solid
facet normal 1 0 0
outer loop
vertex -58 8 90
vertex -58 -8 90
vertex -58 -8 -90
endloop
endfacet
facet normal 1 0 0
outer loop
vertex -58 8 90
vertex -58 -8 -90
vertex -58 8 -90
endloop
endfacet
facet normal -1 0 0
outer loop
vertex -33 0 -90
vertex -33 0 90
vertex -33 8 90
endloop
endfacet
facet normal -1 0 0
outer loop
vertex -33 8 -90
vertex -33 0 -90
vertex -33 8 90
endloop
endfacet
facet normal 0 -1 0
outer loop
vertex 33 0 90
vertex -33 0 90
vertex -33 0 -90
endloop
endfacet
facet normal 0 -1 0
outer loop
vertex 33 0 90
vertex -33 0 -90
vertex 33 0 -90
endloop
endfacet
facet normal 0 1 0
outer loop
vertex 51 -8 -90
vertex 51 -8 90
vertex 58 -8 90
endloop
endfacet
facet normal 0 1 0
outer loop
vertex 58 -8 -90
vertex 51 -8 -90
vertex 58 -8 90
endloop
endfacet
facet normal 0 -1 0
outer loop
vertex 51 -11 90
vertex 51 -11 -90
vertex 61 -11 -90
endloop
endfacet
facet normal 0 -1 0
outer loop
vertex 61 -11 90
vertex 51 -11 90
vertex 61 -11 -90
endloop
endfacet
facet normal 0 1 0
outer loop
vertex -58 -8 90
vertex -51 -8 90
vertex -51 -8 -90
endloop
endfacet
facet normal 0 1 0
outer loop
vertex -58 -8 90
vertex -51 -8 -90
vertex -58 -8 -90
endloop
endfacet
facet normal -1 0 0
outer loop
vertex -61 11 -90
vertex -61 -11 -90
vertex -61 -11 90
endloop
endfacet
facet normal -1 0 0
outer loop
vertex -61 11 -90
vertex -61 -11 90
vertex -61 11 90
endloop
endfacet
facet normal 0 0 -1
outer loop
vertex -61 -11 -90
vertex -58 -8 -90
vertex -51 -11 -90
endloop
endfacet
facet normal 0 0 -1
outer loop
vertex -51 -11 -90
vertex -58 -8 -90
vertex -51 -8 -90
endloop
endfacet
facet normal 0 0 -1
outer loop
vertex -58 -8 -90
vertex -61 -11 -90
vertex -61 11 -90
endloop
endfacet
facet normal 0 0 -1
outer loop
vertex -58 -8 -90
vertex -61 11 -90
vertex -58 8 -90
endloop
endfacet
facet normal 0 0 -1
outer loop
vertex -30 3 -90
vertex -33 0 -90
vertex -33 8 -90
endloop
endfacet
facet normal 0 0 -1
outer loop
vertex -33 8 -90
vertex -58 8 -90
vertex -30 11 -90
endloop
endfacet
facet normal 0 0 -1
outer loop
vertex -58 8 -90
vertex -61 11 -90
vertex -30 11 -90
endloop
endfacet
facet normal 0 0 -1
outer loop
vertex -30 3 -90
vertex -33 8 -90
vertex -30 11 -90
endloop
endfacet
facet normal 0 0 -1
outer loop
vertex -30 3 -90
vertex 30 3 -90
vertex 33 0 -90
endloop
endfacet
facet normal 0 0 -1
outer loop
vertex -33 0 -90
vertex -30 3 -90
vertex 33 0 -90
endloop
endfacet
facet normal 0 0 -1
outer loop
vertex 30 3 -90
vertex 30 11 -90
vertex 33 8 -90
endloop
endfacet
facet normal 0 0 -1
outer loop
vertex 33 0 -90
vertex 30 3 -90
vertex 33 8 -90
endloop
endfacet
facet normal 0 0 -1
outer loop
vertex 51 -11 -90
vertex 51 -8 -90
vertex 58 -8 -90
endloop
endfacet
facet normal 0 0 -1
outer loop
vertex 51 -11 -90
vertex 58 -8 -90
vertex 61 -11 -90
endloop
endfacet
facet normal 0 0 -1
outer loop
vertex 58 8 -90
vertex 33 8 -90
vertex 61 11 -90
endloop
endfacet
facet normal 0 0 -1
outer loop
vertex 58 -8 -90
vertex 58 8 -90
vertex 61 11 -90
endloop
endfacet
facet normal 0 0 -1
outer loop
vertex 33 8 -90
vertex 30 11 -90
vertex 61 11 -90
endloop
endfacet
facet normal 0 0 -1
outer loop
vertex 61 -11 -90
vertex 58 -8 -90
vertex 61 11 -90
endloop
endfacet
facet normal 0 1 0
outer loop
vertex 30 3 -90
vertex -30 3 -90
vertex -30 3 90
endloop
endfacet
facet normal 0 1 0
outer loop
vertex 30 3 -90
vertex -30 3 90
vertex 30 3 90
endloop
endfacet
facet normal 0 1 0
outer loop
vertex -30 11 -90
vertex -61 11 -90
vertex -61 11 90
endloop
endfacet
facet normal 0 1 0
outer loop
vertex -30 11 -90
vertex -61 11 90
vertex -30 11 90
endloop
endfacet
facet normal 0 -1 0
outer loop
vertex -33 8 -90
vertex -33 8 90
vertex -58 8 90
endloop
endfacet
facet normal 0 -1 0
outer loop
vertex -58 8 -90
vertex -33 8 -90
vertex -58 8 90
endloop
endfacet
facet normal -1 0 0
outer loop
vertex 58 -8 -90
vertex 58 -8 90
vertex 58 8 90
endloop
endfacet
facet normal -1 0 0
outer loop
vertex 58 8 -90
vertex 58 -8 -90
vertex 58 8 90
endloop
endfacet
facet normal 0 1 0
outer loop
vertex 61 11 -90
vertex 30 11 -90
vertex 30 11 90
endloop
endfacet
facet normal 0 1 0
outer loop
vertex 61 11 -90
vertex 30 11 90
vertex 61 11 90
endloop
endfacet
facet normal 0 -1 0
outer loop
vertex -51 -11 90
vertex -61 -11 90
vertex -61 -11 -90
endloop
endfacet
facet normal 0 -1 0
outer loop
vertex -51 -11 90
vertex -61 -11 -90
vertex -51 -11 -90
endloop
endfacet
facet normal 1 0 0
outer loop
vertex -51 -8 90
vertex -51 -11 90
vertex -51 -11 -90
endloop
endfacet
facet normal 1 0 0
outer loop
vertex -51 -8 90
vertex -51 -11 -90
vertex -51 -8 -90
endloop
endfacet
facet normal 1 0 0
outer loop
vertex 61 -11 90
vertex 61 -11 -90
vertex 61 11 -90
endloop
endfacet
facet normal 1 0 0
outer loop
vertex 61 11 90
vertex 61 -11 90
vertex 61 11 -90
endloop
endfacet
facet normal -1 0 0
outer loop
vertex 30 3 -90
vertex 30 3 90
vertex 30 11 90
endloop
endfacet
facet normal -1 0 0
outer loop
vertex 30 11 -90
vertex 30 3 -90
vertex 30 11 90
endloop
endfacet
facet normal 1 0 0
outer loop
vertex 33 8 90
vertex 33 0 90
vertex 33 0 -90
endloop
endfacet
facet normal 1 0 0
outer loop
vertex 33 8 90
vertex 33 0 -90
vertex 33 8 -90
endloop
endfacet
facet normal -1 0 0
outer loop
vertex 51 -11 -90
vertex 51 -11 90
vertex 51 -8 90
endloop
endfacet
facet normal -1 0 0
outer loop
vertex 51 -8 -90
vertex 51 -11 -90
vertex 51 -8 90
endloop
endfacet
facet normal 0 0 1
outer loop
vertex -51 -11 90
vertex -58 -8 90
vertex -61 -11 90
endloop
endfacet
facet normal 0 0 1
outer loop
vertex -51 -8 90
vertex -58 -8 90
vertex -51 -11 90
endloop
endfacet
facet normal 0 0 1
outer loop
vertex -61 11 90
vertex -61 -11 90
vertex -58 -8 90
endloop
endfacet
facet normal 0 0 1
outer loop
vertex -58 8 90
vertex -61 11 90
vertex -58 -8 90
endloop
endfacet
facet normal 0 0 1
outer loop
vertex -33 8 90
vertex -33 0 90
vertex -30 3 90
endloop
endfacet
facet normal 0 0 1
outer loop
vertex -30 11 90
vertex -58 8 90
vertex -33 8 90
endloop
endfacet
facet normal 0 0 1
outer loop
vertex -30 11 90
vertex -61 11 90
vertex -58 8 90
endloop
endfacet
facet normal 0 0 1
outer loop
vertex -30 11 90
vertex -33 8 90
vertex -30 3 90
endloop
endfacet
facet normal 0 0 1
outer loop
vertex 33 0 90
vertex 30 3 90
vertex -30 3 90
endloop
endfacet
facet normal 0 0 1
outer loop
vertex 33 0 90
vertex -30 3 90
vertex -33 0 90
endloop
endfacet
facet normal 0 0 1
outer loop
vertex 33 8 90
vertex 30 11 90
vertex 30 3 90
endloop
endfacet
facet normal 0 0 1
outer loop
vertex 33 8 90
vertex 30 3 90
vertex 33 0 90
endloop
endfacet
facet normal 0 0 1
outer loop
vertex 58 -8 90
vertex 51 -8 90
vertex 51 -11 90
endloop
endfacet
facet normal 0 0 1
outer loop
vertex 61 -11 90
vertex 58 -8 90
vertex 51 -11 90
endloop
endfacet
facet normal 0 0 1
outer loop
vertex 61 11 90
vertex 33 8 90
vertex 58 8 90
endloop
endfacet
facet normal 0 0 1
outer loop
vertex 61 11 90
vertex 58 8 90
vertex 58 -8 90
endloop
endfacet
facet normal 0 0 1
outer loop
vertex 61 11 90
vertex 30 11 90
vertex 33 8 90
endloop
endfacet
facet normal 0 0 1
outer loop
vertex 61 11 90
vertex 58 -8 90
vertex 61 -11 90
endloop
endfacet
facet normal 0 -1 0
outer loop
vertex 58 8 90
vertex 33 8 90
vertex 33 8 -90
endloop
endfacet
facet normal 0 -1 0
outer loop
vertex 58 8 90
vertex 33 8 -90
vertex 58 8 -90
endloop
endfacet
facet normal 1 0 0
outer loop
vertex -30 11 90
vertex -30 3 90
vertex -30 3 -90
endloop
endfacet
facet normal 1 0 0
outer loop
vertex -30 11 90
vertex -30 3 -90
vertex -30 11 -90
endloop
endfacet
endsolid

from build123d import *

# Parameters (mm, degrees)
BOSS_EXTRUDE1_DEPTH      = 90
BOSS_EXTRUDE1_DEPTH_BACK = 90
SKETCH1_W                = 122
SKETCH1_H                = 22
SKETCH2_W                = 25
SKETCH2_H                = 16
CUT_EXTRUDE1_DEPTH       = 191.373317458
SKETCH3_W                = 60
SKETCH3_H                = 16
CUT_EXTRUDE2_DEPTH       = 191.373317458
SKETCH4_W                = 60.154663558
SKETCH4_H                = 22
CUT_EXTRUDE3_DEPTH       = 191.373317458
SKETCH5_W                = 20.922668221
SKETCH5_H                = 11
CUT_EXTRUDE4_DEPTH       = 191.373317458


with BuildPart() as part:
    # Sketch1 → Boss-Extrude1 (new, two sides: drawn at the far end of the back side and taken through both)
    with BuildSketch(Plane.XY.offset(-BOSS_EXTRUDE1_DEPTH_BACK)):
        Rectangle(SKETCH1_W, SKETCH1_H)
    extrude(amount=BOSS_EXTRUDE1_DEPTH + BOSS_EXTRUDE1_DEPTH_BACK)

    # Sketch2 → Cut-Extrude1 (cut, symmetric)
    with BuildSketch(Plane.XY.offset(90)):
        with Locations((45.5, 0)):
            Rectangle(SKETCH2_W, SKETCH2_H)
    cut_extrude1 = extrude(amount=CUT_EXTRUDE1_DEPTH, both=True, mode=Mode.SUBTRACT)

    # Mirror1: Cut-Extrude1 across plane
    add(cut_extrude1.mirror(Plane(origin=(0, 0, 0), x_dir=(0, 0, 1), z_dir=(1, 0, 0))), mode=Mode.SUBTRACT)

    # Sketch3 → Cut-Extrude2 (cut, through all)
    with BuildSketch(Plane.XY.offset(90)):
        with Locations((0, 11)):
            Rectangle(SKETCH3_W, SKETCH3_H)
    extrude(amount=-CUT_EXTRUDE2_DEPTH, mode=Mode.SUBTRACT)

    # Sketch4 → Cut-Extrude3 (cut, through all)
    with BuildSketch(Plane.XY.offset(90)):
        with Locations((0, -11)):
            Rectangle(SKETCH4_W, SKETCH4_H)
    extrude(amount=-CUT_EXTRUDE3_DEPTH, mode=Mode.SUBTRACT)

    # Sketch5 → Cut-Extrude4 (cut, through all)
    with BuildSketch(Plane.XY.offset(90)):
        with Locations((40.53866589, -5.5)):
            Rectangle(SKETCH5_W, SKETCH5_H)
    cut_extrude4 = extrude(amount=-CUT_EXTRUDE4_DEPTH, mode=Mode.SUBTRACT)

    # Mirror2: Cut-Extrude4 across plane
    add(cut_extrude4.mirror(Plane(origin=(0, 0, 0), x_dir=(0, 0, 1), z_dir=(1, 0, 0))), mode=Mode.SUBTRACT)


solid = part.part
